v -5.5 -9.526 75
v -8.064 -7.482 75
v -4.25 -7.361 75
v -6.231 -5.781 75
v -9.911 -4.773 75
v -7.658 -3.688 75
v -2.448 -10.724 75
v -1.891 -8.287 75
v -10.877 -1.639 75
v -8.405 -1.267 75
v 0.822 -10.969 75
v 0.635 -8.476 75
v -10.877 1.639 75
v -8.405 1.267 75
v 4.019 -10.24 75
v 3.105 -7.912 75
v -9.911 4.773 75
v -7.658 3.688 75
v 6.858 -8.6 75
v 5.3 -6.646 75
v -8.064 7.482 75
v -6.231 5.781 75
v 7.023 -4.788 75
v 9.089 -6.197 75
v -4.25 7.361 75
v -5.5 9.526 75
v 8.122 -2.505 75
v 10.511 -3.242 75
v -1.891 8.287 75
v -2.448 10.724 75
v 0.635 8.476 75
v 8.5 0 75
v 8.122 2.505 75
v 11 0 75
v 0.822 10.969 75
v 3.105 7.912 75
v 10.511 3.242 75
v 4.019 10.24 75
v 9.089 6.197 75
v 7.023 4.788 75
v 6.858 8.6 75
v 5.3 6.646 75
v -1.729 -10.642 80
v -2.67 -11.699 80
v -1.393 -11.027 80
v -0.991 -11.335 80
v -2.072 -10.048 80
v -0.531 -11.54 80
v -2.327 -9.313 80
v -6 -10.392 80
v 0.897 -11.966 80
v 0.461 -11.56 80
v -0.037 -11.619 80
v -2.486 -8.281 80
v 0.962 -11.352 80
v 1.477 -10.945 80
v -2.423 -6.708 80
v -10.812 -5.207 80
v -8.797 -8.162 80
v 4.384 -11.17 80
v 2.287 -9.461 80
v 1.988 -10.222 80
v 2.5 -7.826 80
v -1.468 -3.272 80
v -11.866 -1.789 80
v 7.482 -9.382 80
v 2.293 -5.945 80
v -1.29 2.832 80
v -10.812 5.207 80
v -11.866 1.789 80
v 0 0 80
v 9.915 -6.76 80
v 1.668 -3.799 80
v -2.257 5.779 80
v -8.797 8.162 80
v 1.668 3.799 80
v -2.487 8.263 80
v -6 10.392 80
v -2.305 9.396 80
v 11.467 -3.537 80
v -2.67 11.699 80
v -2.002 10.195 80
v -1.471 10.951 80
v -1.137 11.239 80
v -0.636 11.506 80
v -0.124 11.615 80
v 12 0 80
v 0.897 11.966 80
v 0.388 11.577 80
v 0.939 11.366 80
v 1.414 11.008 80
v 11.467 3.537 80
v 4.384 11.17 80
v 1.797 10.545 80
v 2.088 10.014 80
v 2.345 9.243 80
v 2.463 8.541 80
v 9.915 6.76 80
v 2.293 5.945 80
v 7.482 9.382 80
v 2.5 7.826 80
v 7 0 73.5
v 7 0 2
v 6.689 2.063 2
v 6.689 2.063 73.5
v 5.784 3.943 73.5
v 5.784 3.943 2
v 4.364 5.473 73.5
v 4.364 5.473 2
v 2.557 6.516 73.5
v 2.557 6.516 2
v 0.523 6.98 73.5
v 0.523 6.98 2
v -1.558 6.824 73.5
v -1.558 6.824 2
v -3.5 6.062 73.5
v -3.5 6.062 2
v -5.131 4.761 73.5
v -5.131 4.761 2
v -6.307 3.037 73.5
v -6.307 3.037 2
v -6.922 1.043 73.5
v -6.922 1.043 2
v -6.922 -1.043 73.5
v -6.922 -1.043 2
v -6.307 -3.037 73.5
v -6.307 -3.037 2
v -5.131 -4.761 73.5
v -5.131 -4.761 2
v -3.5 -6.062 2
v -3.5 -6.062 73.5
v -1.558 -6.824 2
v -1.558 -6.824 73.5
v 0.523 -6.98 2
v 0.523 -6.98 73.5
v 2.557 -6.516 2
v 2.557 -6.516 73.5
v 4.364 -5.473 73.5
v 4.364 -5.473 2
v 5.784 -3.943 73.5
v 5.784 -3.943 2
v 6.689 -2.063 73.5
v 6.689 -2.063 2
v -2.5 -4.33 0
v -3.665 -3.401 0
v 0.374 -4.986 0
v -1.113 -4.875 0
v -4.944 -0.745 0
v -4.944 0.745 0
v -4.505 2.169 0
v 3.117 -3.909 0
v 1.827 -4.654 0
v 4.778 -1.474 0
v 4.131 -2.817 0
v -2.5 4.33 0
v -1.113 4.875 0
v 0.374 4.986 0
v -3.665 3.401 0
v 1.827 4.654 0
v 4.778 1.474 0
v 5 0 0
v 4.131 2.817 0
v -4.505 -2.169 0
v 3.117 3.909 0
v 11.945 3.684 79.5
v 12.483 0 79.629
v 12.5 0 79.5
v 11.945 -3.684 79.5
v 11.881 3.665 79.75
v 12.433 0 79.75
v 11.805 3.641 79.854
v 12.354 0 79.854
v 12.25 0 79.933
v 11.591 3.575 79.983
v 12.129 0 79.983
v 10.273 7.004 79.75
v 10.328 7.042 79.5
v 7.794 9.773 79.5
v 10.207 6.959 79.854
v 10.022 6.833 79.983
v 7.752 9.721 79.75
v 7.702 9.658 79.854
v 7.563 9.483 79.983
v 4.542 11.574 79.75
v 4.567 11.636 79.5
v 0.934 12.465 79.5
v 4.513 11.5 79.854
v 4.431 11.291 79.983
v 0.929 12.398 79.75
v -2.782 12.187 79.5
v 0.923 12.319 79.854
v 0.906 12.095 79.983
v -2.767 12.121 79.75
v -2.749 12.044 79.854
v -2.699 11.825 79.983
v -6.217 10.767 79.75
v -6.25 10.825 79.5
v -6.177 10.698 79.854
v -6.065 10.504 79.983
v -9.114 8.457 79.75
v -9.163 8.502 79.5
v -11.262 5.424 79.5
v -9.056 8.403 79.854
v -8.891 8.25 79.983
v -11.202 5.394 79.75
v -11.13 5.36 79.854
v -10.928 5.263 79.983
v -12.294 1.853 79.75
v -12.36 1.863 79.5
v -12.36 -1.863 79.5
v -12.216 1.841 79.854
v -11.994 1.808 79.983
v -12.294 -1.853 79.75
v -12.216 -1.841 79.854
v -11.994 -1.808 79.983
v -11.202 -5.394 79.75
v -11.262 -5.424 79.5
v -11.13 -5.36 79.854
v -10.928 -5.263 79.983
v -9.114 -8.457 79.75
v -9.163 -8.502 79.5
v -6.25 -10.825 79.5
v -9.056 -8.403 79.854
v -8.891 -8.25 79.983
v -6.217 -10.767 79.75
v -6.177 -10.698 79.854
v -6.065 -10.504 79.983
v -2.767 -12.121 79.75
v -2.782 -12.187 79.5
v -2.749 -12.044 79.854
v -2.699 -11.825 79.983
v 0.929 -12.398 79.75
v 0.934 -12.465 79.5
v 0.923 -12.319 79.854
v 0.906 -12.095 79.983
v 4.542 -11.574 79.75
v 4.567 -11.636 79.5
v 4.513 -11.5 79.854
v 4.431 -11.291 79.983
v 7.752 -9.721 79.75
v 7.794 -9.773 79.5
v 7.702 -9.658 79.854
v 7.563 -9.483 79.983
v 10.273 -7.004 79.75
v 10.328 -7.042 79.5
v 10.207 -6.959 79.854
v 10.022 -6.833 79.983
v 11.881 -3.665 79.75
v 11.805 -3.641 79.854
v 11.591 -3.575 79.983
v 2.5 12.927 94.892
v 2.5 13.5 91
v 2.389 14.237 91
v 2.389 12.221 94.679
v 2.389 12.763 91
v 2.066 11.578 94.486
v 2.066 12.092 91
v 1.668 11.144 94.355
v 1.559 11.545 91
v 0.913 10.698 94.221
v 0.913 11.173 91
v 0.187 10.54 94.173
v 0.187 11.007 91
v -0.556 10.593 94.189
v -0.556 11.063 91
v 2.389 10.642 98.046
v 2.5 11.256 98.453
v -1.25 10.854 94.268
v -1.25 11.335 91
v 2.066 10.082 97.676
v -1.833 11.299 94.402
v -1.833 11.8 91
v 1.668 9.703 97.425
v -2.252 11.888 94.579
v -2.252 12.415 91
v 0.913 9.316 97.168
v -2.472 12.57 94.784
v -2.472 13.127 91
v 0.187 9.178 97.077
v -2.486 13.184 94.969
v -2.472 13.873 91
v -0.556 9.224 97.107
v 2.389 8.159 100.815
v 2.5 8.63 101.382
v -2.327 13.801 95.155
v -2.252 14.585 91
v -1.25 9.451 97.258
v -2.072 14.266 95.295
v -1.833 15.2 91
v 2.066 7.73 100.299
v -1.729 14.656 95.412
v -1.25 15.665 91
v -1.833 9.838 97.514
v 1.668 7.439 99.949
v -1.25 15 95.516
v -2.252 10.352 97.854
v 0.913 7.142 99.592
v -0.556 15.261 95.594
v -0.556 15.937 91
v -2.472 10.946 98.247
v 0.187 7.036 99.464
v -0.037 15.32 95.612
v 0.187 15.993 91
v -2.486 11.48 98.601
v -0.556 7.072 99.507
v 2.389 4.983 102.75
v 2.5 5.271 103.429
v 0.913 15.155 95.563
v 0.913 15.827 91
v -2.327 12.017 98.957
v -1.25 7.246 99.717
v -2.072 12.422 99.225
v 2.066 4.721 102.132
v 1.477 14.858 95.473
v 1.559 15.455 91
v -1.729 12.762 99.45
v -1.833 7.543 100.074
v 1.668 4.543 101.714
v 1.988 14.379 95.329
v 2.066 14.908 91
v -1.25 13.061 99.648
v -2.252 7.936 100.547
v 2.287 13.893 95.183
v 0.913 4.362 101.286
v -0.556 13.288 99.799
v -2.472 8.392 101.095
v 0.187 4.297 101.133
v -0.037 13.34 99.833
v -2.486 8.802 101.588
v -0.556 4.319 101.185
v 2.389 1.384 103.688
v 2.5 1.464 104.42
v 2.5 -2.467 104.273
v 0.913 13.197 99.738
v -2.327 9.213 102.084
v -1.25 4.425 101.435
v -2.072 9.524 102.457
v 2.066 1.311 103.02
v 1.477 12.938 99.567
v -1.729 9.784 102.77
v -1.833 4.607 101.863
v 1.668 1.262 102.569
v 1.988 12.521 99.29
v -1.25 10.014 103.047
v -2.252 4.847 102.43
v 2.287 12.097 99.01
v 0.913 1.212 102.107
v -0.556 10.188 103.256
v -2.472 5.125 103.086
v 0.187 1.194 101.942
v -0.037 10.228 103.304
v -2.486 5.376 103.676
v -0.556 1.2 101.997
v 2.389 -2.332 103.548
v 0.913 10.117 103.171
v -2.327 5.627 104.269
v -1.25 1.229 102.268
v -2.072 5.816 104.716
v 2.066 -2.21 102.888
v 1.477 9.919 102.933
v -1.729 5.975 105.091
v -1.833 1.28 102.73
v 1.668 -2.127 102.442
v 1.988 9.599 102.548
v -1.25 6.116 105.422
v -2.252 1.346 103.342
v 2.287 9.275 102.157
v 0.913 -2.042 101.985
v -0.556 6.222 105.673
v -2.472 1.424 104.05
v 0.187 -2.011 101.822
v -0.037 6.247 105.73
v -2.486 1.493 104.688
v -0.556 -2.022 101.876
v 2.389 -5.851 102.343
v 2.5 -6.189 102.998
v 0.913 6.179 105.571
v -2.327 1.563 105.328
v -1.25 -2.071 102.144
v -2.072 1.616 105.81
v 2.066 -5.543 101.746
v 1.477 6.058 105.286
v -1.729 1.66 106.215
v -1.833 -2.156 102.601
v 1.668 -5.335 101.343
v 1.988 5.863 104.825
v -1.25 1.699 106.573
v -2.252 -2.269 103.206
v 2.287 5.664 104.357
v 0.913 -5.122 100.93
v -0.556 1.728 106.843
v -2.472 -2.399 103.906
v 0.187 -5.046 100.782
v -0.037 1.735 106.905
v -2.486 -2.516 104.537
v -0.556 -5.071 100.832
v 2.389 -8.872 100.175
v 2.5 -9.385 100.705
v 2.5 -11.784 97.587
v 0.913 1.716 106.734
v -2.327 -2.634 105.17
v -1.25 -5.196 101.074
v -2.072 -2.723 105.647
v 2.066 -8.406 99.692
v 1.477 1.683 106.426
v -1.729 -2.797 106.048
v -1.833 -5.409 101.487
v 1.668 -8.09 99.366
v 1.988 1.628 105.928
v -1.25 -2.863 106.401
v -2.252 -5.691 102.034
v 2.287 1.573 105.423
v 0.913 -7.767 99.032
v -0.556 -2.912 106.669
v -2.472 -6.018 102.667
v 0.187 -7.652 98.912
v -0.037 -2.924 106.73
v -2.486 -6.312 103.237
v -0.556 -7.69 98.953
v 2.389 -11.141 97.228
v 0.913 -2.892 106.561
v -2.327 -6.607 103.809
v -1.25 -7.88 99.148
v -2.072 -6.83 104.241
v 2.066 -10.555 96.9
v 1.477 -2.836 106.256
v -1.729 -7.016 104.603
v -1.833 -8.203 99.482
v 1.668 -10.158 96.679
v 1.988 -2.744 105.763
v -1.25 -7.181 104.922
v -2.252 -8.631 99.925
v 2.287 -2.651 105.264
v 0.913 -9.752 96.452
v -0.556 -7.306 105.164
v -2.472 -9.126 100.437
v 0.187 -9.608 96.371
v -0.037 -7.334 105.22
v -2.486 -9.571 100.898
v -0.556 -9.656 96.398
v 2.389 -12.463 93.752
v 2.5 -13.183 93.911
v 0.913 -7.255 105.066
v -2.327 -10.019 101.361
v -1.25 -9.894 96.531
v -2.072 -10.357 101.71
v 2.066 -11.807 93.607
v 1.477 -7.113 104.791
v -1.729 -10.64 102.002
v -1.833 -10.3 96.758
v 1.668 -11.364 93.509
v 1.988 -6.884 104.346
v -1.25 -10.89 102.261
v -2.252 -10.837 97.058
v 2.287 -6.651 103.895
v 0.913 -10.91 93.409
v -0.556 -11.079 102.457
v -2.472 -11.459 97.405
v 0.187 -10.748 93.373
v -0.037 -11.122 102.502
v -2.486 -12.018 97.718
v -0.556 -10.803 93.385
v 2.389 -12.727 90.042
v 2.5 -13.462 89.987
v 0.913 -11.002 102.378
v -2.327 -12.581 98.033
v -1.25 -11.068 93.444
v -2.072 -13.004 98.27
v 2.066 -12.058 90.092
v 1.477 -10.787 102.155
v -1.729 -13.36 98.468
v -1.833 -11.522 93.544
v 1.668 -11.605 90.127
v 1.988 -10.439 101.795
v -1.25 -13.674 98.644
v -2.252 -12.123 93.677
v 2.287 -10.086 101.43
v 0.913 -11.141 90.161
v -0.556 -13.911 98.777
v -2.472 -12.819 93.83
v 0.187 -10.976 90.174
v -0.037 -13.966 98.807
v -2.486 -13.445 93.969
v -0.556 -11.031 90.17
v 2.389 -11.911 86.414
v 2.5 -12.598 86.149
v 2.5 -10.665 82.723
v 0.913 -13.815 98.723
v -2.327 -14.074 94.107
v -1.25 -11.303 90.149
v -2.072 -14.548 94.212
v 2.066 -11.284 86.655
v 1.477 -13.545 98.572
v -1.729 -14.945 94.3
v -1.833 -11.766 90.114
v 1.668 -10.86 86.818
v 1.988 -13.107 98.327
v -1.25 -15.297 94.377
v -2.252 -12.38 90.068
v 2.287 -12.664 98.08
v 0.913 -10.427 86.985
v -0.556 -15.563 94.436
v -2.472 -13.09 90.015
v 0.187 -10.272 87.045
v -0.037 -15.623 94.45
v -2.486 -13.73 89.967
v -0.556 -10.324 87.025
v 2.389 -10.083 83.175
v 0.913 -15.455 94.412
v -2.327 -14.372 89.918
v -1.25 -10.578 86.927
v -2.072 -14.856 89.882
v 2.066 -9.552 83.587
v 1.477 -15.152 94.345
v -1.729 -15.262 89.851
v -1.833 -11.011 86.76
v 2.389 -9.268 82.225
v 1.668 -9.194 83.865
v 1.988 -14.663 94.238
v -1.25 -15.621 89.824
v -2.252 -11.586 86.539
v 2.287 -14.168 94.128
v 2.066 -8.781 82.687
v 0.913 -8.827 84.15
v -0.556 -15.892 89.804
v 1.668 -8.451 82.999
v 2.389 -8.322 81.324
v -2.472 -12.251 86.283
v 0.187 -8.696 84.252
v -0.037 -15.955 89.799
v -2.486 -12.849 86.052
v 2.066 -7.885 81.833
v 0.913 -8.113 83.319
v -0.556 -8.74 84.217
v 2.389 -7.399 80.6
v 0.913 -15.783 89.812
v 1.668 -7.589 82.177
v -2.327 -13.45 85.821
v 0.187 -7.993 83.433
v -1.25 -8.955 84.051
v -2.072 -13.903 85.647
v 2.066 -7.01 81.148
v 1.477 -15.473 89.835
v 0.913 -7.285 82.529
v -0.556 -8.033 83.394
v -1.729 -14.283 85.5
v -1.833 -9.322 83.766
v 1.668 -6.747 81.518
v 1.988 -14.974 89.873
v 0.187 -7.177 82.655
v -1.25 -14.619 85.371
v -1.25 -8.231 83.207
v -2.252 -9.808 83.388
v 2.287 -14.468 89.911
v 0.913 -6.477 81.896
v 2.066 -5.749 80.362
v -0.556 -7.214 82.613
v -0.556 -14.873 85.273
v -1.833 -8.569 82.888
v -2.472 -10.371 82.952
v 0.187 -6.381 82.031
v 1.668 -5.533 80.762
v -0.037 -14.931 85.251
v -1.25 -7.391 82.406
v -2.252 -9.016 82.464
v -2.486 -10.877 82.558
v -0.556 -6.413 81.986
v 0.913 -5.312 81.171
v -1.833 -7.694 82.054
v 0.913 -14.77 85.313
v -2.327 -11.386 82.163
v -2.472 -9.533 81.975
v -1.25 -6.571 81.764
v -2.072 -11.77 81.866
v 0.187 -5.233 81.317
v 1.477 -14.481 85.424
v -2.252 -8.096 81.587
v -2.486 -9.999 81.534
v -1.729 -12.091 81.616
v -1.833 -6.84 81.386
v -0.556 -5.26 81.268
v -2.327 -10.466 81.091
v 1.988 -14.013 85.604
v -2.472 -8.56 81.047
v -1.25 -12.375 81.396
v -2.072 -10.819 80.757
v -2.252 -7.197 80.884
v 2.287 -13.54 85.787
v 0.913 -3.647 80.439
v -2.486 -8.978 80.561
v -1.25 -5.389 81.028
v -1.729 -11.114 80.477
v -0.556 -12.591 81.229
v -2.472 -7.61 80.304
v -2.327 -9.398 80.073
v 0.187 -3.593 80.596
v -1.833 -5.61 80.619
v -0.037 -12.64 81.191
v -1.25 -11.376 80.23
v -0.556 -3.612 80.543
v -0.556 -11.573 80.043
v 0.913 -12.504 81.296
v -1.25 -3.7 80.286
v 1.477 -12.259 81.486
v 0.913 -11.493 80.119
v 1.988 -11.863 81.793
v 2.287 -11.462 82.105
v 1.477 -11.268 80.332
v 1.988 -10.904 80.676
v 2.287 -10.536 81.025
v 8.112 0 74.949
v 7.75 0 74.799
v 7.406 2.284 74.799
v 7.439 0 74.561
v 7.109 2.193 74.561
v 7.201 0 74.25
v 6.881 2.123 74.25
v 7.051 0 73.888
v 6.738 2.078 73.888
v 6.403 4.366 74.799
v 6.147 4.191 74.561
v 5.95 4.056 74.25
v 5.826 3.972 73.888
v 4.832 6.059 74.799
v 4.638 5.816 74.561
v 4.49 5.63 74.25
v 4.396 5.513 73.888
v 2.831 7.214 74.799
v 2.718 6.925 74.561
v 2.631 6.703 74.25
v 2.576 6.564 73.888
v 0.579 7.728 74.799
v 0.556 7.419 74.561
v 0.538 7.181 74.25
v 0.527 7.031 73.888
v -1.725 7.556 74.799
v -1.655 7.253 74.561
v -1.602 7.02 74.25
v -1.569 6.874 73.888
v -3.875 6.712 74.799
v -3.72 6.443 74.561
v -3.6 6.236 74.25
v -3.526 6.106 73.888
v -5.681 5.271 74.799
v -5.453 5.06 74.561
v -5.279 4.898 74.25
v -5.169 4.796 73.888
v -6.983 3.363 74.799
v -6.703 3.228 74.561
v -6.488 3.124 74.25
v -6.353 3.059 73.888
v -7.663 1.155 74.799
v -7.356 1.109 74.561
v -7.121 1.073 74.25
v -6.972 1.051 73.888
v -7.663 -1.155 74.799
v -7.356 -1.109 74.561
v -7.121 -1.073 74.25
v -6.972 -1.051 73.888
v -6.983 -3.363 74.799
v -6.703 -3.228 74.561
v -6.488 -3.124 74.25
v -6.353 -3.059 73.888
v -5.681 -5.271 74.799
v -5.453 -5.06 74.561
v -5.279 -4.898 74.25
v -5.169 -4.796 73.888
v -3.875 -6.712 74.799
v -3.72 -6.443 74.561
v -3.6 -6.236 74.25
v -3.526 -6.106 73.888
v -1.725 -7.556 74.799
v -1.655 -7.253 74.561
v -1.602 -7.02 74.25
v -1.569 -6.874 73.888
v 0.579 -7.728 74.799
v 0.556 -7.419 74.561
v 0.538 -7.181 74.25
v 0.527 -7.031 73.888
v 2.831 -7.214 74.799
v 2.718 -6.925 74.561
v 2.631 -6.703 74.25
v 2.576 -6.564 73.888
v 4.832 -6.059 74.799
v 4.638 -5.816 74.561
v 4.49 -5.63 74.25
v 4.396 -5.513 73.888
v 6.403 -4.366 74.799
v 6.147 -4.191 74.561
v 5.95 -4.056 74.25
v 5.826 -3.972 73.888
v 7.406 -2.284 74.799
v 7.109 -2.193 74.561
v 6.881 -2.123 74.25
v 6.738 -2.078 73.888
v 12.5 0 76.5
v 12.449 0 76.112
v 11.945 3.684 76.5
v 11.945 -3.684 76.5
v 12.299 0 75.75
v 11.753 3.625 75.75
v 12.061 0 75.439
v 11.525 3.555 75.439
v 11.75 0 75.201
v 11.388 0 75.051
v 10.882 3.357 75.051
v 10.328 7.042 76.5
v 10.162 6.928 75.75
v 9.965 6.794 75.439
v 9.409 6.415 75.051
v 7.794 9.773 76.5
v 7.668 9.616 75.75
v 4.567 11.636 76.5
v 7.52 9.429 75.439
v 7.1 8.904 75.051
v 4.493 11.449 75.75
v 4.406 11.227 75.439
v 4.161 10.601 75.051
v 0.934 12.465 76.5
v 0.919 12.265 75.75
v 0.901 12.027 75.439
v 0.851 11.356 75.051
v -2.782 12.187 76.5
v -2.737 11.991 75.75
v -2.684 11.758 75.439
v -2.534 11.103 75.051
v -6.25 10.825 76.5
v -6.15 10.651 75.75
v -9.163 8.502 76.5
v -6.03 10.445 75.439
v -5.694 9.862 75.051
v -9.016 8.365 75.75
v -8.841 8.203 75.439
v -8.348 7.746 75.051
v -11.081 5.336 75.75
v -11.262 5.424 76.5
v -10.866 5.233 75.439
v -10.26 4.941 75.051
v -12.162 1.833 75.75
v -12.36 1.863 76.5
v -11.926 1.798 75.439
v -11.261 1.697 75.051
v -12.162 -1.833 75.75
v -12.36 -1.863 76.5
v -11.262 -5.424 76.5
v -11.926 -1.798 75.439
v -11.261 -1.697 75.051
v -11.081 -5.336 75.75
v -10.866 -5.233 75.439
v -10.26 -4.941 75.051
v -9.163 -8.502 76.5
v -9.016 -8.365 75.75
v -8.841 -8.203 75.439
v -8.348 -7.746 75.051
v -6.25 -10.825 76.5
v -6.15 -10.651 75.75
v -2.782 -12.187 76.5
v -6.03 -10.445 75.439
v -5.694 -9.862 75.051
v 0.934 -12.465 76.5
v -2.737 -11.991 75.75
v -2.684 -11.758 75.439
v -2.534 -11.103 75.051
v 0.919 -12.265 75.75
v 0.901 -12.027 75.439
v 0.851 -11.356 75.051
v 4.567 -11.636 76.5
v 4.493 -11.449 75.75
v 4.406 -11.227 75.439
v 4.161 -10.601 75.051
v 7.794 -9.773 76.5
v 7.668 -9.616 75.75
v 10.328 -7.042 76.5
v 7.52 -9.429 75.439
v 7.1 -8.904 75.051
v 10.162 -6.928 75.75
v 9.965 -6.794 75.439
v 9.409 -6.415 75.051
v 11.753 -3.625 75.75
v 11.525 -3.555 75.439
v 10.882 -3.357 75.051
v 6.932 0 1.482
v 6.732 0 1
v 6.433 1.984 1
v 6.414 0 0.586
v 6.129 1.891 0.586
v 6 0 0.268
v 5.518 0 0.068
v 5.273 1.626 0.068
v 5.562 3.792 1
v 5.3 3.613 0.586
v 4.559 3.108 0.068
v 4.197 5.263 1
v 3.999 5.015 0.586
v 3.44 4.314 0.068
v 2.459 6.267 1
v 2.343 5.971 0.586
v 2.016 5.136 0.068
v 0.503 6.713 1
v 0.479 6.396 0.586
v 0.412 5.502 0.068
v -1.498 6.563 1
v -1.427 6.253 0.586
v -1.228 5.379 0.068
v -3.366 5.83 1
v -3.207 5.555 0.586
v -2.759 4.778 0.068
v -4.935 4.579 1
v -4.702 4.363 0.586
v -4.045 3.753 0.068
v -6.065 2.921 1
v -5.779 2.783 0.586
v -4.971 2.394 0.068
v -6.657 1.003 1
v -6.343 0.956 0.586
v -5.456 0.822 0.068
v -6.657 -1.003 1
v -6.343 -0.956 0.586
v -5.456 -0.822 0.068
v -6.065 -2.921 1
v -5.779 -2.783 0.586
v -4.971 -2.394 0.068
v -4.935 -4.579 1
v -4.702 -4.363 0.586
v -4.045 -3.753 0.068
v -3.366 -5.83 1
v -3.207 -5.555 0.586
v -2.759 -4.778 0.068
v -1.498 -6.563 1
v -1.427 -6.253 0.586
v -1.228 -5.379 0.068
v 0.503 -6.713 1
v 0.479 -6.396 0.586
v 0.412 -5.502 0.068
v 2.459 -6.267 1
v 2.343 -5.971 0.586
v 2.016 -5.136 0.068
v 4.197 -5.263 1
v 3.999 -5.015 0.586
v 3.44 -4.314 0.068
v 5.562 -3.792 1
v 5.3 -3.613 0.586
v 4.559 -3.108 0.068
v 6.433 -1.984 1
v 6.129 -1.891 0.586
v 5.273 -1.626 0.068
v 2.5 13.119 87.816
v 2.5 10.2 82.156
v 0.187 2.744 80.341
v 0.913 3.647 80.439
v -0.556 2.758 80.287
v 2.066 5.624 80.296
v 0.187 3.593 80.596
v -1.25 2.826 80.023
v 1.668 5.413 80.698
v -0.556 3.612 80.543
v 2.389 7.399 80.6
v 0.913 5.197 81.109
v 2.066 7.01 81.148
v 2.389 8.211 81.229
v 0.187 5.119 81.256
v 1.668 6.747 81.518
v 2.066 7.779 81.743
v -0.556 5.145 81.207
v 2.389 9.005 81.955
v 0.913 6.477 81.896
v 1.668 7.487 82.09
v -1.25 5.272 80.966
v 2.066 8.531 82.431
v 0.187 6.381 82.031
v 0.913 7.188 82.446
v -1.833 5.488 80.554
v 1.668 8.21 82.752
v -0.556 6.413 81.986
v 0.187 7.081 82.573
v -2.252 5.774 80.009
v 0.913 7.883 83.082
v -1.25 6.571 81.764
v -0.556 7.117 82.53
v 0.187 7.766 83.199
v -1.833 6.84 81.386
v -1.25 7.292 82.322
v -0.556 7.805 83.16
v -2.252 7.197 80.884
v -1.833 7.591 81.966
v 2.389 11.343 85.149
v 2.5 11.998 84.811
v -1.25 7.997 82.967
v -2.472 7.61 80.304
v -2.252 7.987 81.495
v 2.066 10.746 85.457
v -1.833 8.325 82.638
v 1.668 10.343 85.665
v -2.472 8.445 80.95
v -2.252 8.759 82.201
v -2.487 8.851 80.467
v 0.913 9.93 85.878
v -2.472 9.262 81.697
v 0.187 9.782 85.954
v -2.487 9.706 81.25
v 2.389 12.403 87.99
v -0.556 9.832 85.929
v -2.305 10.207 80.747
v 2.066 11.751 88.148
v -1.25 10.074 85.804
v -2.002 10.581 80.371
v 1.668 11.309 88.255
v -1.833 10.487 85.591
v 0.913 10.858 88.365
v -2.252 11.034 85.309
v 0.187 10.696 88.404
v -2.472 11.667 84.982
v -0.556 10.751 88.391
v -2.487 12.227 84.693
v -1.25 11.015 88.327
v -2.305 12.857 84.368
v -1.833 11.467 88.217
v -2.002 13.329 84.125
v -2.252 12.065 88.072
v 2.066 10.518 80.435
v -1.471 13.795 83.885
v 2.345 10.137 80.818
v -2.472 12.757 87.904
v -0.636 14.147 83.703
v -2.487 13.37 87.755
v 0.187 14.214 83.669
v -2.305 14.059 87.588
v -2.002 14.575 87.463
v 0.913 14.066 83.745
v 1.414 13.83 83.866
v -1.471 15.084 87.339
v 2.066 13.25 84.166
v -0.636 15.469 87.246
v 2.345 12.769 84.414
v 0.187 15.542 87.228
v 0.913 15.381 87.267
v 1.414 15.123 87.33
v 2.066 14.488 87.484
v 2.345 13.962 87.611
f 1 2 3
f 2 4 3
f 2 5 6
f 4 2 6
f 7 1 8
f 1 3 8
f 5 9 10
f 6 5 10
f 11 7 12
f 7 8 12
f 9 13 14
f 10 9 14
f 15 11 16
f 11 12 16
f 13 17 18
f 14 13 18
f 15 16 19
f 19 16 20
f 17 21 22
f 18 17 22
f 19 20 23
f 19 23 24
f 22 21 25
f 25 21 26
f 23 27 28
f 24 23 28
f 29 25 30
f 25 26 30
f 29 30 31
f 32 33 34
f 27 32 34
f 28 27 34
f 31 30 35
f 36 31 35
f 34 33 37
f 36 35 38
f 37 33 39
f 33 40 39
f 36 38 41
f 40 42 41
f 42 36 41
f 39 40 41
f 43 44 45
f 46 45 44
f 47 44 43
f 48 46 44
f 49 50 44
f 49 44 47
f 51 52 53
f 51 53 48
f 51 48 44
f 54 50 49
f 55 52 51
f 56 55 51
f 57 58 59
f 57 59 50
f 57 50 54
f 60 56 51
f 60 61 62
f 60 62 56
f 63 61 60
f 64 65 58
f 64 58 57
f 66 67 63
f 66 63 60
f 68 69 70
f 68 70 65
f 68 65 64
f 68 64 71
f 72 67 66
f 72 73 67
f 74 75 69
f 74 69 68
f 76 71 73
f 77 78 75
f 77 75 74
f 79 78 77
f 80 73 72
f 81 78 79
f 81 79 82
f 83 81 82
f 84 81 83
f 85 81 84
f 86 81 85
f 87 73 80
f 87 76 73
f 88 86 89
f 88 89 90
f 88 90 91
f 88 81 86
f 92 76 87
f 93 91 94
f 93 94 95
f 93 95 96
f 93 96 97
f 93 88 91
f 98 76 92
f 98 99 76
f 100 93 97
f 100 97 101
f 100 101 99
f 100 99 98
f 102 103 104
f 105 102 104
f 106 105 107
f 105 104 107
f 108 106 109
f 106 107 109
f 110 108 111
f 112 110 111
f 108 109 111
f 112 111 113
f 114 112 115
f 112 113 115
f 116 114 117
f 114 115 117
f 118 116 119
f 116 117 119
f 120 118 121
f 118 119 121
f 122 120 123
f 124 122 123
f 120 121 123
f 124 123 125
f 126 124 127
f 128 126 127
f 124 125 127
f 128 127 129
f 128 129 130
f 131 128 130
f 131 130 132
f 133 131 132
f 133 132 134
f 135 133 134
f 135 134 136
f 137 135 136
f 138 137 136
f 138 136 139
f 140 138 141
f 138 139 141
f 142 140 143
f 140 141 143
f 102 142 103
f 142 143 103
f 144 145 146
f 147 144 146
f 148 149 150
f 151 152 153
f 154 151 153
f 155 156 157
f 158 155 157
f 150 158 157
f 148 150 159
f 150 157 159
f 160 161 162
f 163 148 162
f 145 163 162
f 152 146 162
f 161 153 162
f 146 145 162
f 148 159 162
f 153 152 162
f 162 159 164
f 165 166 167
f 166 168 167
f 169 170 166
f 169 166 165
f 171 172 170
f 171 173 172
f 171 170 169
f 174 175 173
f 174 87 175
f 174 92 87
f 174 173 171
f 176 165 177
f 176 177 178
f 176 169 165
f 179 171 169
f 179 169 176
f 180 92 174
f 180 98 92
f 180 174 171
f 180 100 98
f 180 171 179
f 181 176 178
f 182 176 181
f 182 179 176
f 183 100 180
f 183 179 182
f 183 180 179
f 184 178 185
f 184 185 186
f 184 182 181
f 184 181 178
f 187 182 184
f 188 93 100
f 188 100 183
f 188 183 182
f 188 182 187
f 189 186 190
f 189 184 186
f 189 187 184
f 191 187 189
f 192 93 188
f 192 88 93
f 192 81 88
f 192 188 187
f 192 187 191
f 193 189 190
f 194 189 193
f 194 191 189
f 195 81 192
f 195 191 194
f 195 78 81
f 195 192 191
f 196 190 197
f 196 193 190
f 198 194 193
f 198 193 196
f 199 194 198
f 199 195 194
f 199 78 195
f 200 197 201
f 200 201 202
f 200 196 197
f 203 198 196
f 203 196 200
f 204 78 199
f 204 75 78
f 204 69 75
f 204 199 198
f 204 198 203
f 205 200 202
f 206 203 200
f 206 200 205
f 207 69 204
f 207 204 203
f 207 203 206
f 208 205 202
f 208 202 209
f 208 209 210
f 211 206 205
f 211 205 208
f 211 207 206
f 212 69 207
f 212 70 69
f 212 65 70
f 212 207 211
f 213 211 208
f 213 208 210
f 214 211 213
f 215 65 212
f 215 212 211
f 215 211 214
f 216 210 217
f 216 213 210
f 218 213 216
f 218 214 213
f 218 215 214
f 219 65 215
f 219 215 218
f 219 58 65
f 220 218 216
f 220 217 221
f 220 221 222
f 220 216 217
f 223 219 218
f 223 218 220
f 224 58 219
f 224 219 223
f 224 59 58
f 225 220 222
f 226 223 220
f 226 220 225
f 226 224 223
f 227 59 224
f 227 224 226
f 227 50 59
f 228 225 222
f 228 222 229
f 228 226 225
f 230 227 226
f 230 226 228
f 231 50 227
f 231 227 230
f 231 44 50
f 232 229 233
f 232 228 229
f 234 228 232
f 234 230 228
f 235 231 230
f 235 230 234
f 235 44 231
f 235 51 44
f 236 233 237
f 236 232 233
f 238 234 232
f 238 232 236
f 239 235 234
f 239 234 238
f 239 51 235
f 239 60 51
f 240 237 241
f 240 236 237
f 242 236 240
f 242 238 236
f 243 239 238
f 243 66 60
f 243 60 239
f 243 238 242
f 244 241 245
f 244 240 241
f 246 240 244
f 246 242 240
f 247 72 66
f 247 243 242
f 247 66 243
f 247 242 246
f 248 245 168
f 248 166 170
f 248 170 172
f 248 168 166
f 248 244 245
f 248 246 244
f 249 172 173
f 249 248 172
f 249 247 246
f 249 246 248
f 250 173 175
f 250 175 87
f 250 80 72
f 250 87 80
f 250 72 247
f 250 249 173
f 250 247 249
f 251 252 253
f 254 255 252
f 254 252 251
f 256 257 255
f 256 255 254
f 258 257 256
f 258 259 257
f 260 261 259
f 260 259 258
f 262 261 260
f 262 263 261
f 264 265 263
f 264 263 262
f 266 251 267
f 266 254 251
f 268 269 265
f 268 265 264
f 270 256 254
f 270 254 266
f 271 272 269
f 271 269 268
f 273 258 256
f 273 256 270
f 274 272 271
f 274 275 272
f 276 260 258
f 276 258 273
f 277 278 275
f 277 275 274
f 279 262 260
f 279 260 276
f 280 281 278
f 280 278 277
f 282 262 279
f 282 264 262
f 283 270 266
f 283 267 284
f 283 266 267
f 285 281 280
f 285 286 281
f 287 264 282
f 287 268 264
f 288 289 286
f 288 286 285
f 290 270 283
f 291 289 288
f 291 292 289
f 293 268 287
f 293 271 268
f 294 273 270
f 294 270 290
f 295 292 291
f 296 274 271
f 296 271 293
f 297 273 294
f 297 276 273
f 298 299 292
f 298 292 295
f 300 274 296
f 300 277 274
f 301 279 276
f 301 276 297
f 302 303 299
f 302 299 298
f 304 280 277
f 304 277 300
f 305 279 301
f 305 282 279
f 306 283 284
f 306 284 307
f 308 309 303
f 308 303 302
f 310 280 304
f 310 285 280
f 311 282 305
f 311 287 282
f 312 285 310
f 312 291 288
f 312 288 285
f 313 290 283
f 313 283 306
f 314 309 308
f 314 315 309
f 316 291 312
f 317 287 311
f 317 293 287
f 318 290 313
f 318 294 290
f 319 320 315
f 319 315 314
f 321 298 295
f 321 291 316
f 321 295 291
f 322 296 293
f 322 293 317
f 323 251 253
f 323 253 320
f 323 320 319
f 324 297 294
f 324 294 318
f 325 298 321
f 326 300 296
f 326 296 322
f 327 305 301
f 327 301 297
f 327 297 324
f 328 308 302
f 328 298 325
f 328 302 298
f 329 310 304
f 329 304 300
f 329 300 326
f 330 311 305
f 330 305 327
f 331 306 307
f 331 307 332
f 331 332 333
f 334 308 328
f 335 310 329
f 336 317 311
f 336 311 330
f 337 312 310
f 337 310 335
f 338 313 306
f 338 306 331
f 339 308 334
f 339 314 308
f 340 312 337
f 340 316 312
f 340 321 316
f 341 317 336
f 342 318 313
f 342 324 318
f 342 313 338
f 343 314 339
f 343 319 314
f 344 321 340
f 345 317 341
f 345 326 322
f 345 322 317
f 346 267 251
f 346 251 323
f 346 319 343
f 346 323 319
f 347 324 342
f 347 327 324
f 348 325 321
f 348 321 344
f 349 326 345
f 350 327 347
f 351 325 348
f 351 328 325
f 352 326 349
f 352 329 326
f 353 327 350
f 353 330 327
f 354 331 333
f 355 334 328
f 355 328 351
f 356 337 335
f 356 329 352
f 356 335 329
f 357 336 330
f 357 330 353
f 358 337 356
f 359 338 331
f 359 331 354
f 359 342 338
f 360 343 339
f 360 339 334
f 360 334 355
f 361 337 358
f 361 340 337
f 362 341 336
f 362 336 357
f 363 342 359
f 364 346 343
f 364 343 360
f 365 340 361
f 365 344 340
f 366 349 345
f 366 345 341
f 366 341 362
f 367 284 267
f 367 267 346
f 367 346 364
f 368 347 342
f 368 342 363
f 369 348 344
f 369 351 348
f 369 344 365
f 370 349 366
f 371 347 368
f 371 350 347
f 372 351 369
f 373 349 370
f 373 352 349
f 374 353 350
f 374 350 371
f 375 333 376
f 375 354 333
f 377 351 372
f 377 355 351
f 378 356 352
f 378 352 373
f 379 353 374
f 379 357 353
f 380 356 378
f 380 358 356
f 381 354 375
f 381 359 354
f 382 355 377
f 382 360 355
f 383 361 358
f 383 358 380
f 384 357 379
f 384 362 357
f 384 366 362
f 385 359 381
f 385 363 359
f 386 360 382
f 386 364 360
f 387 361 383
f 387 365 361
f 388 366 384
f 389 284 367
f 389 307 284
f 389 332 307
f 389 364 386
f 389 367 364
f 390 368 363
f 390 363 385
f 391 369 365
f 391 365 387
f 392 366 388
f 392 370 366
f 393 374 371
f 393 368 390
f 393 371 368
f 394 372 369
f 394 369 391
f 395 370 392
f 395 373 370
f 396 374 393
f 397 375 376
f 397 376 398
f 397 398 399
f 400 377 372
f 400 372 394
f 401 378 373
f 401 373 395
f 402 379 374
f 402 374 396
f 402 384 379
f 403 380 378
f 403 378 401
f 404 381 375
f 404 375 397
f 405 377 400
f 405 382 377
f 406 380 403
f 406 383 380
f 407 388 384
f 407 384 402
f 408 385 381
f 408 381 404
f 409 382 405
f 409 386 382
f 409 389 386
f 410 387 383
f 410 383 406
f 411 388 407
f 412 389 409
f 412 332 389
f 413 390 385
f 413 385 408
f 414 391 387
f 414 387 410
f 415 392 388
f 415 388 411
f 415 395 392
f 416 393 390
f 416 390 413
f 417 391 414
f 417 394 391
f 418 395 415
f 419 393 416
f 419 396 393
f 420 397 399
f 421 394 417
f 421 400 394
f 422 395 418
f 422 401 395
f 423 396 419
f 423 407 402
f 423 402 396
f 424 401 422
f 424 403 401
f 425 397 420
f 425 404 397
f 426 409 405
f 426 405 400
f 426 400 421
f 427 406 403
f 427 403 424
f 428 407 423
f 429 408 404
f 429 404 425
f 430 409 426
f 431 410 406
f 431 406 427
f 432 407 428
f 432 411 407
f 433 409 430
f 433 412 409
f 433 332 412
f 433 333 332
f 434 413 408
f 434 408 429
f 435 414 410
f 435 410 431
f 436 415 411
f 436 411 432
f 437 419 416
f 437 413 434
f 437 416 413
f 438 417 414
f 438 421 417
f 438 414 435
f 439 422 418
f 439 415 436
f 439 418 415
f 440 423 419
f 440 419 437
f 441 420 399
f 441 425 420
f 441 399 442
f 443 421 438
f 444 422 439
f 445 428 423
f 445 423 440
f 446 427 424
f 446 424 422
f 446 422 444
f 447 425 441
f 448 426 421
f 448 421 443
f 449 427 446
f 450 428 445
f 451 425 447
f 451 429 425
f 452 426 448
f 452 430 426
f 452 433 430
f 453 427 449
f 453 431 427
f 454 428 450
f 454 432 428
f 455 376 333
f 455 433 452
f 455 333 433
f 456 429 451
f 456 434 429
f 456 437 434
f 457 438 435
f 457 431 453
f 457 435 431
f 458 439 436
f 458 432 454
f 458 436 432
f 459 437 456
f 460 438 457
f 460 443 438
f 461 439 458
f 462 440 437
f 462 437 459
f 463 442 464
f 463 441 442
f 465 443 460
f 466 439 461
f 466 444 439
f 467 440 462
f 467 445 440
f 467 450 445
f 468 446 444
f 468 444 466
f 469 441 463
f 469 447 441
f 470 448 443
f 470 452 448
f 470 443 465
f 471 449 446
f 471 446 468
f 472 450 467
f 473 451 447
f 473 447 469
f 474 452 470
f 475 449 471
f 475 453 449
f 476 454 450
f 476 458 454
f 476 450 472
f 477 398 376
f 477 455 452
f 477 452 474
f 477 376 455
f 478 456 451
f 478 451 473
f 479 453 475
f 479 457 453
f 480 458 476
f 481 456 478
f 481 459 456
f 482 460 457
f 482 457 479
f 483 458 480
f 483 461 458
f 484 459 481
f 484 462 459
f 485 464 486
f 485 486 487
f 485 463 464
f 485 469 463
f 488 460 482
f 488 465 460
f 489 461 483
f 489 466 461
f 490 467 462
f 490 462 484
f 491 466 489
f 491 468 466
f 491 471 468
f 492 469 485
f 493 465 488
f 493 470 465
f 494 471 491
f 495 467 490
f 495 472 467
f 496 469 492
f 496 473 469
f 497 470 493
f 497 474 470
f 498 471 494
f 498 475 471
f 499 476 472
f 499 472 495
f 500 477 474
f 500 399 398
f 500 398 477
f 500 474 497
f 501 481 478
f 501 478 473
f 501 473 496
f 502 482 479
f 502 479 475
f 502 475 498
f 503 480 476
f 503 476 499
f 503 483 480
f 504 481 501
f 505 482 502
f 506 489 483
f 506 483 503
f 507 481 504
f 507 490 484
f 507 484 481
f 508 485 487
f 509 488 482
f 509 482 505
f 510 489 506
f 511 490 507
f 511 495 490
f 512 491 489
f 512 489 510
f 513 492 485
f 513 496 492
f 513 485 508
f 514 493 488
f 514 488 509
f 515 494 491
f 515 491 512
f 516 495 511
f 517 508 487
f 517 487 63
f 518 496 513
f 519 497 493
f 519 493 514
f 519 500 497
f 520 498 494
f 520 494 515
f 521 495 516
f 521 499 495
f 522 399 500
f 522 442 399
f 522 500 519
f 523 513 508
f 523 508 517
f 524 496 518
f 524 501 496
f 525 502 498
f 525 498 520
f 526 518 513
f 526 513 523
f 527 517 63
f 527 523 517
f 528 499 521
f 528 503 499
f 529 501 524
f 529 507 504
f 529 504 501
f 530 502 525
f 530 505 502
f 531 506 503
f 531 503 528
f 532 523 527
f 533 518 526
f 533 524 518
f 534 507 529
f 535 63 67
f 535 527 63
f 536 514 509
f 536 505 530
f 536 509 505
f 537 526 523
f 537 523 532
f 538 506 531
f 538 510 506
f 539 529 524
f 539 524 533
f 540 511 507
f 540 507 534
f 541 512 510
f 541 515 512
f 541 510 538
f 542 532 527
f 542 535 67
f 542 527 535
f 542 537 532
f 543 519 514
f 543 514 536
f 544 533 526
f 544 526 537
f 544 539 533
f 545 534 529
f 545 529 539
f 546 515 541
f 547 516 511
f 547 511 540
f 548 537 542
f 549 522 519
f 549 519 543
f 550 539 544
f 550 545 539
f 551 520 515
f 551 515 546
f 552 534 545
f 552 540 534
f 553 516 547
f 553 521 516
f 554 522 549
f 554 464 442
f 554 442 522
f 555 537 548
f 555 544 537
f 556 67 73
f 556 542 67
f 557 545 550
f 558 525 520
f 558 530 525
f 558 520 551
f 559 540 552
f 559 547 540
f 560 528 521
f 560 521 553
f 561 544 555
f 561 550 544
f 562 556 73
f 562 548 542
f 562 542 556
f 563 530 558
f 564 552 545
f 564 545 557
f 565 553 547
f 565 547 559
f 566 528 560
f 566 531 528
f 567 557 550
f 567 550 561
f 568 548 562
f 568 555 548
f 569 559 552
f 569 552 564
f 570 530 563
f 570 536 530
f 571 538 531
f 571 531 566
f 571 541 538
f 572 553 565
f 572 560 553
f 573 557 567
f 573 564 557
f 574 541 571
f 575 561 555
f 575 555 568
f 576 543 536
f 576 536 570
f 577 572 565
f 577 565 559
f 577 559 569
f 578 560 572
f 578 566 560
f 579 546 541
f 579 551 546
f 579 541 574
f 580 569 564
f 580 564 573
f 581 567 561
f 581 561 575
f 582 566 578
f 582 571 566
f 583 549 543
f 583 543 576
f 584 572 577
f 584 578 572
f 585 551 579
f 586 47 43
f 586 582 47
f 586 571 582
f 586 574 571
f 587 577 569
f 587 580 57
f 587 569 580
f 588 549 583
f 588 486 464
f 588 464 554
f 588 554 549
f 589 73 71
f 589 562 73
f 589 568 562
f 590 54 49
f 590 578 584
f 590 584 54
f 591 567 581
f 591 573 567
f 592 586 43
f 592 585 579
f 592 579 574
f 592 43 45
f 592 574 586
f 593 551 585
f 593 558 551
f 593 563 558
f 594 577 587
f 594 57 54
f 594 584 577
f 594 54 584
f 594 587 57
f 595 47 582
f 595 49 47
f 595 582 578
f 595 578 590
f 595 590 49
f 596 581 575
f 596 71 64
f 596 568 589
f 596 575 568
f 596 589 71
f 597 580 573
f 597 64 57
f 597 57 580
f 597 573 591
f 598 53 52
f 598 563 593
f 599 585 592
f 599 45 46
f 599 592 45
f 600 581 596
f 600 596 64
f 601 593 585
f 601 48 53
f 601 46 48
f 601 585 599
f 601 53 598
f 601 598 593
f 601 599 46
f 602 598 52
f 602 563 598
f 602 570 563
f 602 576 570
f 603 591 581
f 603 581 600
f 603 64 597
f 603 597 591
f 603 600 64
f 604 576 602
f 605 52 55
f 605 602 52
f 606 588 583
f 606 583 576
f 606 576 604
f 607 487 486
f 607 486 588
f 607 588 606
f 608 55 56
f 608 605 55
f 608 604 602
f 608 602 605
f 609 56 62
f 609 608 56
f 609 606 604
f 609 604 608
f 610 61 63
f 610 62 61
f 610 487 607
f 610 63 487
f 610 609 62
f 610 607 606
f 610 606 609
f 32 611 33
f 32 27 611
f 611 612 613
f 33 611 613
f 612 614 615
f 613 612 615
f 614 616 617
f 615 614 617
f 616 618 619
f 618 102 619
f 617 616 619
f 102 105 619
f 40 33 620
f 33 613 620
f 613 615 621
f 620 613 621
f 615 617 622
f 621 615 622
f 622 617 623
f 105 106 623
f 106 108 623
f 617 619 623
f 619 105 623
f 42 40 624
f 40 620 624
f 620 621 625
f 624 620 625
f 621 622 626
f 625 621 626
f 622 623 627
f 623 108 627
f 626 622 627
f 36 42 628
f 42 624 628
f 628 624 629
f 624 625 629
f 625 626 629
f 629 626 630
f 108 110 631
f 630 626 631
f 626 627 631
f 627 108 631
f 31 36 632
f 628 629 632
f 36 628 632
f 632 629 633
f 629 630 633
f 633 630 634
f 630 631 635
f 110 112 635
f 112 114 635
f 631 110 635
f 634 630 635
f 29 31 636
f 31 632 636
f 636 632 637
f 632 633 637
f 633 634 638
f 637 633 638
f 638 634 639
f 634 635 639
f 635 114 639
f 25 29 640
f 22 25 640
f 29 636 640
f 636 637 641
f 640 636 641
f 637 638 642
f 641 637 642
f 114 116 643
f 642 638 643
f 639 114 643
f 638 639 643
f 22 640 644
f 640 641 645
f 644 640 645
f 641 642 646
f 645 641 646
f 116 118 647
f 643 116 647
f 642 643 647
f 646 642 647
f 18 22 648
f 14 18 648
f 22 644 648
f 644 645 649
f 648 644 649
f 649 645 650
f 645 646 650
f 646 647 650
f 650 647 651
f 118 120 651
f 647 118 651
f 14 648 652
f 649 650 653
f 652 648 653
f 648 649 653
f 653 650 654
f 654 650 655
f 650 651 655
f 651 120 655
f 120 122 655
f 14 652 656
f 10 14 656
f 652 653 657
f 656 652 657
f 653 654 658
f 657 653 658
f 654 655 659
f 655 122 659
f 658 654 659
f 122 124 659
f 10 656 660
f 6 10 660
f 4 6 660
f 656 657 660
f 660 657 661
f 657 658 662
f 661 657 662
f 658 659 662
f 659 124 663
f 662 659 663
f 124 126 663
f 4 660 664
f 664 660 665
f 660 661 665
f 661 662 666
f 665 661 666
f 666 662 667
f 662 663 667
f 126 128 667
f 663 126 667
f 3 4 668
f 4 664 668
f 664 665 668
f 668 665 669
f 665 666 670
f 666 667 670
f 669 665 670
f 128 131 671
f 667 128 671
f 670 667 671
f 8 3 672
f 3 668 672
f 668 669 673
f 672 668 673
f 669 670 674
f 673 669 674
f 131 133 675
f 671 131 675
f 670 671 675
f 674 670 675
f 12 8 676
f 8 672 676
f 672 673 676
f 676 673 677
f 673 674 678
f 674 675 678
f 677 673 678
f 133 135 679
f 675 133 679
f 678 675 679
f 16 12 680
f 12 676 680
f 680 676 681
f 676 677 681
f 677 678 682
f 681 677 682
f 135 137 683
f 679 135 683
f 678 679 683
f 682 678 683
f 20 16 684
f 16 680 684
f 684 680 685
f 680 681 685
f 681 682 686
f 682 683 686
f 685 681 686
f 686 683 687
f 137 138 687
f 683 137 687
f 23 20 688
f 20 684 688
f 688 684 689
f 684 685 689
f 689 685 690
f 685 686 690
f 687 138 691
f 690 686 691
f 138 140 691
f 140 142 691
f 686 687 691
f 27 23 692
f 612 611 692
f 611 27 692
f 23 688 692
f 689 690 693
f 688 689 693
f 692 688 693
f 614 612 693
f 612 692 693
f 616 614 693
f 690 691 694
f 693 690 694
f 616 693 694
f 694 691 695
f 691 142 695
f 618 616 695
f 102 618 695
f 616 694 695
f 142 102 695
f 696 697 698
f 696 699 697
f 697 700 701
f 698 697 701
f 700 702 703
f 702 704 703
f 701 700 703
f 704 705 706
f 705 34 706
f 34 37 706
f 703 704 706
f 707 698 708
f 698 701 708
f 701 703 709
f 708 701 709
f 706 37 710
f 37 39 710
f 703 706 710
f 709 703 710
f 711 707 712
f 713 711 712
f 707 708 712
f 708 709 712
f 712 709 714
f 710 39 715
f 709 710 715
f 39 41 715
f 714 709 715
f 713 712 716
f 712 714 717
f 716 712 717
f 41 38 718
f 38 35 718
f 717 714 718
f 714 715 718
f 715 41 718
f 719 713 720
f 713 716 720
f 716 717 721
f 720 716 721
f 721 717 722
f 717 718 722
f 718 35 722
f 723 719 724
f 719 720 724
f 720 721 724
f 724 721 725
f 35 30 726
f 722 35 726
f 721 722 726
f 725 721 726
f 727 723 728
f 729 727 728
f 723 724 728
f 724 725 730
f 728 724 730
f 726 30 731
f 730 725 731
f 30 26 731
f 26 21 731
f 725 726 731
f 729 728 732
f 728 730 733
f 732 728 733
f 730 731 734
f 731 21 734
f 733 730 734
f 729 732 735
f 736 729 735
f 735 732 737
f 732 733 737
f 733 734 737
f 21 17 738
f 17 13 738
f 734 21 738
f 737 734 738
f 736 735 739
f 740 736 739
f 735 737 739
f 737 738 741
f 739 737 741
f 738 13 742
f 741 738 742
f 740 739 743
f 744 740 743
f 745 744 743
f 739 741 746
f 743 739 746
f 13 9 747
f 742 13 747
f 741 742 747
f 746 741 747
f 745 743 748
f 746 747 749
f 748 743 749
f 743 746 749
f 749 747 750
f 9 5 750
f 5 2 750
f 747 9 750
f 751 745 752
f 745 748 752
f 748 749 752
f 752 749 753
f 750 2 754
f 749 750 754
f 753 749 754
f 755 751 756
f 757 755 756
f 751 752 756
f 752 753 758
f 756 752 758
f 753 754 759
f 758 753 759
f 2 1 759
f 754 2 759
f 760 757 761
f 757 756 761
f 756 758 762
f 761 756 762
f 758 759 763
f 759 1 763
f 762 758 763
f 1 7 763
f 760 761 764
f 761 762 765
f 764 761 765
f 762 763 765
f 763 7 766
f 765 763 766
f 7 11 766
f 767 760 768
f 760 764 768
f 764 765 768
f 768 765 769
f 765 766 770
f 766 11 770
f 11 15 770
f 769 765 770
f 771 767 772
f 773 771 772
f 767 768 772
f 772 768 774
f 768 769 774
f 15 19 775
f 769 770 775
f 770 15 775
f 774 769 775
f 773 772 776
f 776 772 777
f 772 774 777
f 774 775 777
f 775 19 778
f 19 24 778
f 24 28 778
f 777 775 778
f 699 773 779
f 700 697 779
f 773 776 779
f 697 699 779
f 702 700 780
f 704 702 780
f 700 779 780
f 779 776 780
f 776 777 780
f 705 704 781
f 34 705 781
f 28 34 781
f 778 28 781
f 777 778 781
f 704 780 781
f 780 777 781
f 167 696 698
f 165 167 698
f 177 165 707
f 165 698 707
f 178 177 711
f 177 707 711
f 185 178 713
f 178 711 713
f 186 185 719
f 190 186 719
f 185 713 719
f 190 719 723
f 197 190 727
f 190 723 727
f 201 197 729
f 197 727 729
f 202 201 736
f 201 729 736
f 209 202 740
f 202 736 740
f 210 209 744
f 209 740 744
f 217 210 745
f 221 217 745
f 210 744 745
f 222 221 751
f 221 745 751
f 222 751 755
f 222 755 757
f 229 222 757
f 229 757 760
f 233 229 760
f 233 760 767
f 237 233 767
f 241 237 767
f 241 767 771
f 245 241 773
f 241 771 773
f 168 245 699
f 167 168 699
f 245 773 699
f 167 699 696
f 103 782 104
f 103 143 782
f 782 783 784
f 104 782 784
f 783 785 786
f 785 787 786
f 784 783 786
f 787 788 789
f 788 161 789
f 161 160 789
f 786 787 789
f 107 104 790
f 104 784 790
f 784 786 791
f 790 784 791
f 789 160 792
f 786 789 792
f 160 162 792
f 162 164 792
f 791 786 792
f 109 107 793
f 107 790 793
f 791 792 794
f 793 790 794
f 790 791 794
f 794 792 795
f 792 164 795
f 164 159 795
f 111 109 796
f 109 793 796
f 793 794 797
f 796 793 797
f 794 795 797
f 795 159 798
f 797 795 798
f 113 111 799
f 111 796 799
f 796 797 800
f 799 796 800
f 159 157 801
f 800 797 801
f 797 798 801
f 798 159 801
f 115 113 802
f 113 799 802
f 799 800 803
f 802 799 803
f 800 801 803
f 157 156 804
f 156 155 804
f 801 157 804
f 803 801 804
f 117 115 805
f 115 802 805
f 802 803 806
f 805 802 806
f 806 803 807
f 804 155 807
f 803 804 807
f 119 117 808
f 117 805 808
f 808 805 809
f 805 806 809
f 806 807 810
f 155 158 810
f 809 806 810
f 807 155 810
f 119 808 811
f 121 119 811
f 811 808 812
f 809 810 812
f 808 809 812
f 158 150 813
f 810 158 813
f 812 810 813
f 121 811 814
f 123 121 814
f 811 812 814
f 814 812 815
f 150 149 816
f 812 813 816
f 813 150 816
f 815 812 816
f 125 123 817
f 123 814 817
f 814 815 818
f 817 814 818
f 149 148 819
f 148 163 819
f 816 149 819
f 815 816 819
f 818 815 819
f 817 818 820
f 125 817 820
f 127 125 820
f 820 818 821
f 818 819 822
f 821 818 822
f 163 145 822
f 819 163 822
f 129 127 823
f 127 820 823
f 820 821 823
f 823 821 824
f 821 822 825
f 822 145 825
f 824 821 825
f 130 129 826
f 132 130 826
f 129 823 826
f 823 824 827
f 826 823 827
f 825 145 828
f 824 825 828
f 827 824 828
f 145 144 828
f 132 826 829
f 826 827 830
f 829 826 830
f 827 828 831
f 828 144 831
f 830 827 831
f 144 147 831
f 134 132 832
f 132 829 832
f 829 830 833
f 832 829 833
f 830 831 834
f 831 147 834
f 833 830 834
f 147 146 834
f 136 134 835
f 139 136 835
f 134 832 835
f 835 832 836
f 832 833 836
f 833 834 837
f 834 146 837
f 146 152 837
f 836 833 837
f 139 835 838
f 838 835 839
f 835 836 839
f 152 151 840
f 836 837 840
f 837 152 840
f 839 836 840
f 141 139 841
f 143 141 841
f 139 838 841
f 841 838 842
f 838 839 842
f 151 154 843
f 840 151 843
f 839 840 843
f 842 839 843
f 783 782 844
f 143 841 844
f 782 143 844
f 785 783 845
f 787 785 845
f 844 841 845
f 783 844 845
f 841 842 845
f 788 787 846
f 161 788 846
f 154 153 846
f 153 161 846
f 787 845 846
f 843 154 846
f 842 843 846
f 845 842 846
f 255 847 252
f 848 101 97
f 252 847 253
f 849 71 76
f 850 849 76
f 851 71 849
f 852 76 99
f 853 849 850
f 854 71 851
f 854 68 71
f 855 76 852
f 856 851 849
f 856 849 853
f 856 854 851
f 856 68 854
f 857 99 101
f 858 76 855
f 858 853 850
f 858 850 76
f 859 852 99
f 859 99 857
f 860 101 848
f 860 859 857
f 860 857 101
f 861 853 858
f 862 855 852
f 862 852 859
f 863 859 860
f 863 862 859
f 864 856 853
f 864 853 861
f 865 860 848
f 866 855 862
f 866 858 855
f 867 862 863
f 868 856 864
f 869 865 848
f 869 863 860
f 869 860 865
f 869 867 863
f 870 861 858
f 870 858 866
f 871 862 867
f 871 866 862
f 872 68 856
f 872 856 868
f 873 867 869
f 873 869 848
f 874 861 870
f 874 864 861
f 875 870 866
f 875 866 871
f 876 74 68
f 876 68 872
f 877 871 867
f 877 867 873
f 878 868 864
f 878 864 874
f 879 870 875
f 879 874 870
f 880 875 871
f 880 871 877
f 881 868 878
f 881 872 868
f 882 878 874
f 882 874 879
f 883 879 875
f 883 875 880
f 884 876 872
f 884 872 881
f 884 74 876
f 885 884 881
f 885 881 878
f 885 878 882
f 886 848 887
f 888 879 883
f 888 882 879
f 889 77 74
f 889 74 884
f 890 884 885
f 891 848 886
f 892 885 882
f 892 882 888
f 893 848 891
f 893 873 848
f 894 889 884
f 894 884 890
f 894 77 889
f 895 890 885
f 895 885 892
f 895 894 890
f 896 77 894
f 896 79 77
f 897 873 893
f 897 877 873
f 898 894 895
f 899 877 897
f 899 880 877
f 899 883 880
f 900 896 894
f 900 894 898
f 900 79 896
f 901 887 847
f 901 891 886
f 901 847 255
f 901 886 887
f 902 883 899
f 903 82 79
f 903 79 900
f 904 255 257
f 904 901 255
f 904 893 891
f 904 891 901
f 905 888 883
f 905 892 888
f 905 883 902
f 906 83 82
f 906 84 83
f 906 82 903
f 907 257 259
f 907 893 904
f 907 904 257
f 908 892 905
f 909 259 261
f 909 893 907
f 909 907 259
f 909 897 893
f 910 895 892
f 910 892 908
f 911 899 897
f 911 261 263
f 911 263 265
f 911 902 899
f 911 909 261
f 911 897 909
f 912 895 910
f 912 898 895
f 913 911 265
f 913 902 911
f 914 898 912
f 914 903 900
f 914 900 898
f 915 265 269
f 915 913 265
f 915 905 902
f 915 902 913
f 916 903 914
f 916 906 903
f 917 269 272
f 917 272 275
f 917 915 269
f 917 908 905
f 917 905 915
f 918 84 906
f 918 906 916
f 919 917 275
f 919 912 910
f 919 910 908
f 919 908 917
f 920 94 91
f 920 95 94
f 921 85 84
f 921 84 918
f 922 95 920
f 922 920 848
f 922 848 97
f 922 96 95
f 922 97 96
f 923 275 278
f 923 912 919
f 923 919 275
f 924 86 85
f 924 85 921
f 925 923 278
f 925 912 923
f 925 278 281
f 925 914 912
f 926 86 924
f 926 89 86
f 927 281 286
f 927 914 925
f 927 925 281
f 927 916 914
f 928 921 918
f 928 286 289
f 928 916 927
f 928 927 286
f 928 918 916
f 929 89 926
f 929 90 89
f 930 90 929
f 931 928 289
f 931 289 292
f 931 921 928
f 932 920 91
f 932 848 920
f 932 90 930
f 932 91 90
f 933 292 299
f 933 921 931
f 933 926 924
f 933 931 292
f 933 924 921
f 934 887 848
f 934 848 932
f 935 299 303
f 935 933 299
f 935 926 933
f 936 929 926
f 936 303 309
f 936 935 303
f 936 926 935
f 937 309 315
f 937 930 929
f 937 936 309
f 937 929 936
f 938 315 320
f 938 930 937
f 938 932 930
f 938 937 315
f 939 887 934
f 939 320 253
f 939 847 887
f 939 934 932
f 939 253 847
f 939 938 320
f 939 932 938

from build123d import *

# Parameters (mm, degrees)
F0_R     = 7
F1_DEPTH = 75
F2_R     = 12.5
F3_DEPTH = 5
F5_R     = 2.5
F7_R     = 1.5
F8_R     = 0.5
F9_R     = 2


with BuildPart() as f1:
    # F0 (on Top) → F1 (new body)
    with BuildSketch(Plane.XY):
        Circle(F0_R)
    extrude(amount=F1_DEPTH)

    # F2 (on face) → F3 (join)
    with BuildSketch(Plane.XY.offset(75)):
        Circle(F2_R)
    extrude(amount=F3_DEPTH)

    # F6: sweep along a path in F4
    with BuildLine(Plane.YZ) as f6_path:
        CenterArc((0, 91), 12.5, 0, 360)
    # F5 (on Front) → F6 (sweep)
    with BuildSketch(Plane.XZ):
        with Locations((0, 77.5)):
            Circle(F5_R)
    sweep(path=f6_path.line)

    # F7
    f7_edges = [f1.edges().sort_by_distance(p)[0] for p in [
        (-7, 0, 75),
        (-12.5, 0, 75),
    ]]
    fillet(f7_edges, radius=F7_R)

    # F8
    f8_edges = [f1.edges().sort_by_distance(p)[0] for p in [
        (-12.5, 0, 80),
    ]]
    fillet(f8_edges, radius=F8_R)

    # F9
    f9_edges = [f1.edges().sort_by_distance(p)[0] for p in [
        (-7, 0, 0),
    ]]
    fillet(f9_edges, radius=F9_R)


solid = f1.part
